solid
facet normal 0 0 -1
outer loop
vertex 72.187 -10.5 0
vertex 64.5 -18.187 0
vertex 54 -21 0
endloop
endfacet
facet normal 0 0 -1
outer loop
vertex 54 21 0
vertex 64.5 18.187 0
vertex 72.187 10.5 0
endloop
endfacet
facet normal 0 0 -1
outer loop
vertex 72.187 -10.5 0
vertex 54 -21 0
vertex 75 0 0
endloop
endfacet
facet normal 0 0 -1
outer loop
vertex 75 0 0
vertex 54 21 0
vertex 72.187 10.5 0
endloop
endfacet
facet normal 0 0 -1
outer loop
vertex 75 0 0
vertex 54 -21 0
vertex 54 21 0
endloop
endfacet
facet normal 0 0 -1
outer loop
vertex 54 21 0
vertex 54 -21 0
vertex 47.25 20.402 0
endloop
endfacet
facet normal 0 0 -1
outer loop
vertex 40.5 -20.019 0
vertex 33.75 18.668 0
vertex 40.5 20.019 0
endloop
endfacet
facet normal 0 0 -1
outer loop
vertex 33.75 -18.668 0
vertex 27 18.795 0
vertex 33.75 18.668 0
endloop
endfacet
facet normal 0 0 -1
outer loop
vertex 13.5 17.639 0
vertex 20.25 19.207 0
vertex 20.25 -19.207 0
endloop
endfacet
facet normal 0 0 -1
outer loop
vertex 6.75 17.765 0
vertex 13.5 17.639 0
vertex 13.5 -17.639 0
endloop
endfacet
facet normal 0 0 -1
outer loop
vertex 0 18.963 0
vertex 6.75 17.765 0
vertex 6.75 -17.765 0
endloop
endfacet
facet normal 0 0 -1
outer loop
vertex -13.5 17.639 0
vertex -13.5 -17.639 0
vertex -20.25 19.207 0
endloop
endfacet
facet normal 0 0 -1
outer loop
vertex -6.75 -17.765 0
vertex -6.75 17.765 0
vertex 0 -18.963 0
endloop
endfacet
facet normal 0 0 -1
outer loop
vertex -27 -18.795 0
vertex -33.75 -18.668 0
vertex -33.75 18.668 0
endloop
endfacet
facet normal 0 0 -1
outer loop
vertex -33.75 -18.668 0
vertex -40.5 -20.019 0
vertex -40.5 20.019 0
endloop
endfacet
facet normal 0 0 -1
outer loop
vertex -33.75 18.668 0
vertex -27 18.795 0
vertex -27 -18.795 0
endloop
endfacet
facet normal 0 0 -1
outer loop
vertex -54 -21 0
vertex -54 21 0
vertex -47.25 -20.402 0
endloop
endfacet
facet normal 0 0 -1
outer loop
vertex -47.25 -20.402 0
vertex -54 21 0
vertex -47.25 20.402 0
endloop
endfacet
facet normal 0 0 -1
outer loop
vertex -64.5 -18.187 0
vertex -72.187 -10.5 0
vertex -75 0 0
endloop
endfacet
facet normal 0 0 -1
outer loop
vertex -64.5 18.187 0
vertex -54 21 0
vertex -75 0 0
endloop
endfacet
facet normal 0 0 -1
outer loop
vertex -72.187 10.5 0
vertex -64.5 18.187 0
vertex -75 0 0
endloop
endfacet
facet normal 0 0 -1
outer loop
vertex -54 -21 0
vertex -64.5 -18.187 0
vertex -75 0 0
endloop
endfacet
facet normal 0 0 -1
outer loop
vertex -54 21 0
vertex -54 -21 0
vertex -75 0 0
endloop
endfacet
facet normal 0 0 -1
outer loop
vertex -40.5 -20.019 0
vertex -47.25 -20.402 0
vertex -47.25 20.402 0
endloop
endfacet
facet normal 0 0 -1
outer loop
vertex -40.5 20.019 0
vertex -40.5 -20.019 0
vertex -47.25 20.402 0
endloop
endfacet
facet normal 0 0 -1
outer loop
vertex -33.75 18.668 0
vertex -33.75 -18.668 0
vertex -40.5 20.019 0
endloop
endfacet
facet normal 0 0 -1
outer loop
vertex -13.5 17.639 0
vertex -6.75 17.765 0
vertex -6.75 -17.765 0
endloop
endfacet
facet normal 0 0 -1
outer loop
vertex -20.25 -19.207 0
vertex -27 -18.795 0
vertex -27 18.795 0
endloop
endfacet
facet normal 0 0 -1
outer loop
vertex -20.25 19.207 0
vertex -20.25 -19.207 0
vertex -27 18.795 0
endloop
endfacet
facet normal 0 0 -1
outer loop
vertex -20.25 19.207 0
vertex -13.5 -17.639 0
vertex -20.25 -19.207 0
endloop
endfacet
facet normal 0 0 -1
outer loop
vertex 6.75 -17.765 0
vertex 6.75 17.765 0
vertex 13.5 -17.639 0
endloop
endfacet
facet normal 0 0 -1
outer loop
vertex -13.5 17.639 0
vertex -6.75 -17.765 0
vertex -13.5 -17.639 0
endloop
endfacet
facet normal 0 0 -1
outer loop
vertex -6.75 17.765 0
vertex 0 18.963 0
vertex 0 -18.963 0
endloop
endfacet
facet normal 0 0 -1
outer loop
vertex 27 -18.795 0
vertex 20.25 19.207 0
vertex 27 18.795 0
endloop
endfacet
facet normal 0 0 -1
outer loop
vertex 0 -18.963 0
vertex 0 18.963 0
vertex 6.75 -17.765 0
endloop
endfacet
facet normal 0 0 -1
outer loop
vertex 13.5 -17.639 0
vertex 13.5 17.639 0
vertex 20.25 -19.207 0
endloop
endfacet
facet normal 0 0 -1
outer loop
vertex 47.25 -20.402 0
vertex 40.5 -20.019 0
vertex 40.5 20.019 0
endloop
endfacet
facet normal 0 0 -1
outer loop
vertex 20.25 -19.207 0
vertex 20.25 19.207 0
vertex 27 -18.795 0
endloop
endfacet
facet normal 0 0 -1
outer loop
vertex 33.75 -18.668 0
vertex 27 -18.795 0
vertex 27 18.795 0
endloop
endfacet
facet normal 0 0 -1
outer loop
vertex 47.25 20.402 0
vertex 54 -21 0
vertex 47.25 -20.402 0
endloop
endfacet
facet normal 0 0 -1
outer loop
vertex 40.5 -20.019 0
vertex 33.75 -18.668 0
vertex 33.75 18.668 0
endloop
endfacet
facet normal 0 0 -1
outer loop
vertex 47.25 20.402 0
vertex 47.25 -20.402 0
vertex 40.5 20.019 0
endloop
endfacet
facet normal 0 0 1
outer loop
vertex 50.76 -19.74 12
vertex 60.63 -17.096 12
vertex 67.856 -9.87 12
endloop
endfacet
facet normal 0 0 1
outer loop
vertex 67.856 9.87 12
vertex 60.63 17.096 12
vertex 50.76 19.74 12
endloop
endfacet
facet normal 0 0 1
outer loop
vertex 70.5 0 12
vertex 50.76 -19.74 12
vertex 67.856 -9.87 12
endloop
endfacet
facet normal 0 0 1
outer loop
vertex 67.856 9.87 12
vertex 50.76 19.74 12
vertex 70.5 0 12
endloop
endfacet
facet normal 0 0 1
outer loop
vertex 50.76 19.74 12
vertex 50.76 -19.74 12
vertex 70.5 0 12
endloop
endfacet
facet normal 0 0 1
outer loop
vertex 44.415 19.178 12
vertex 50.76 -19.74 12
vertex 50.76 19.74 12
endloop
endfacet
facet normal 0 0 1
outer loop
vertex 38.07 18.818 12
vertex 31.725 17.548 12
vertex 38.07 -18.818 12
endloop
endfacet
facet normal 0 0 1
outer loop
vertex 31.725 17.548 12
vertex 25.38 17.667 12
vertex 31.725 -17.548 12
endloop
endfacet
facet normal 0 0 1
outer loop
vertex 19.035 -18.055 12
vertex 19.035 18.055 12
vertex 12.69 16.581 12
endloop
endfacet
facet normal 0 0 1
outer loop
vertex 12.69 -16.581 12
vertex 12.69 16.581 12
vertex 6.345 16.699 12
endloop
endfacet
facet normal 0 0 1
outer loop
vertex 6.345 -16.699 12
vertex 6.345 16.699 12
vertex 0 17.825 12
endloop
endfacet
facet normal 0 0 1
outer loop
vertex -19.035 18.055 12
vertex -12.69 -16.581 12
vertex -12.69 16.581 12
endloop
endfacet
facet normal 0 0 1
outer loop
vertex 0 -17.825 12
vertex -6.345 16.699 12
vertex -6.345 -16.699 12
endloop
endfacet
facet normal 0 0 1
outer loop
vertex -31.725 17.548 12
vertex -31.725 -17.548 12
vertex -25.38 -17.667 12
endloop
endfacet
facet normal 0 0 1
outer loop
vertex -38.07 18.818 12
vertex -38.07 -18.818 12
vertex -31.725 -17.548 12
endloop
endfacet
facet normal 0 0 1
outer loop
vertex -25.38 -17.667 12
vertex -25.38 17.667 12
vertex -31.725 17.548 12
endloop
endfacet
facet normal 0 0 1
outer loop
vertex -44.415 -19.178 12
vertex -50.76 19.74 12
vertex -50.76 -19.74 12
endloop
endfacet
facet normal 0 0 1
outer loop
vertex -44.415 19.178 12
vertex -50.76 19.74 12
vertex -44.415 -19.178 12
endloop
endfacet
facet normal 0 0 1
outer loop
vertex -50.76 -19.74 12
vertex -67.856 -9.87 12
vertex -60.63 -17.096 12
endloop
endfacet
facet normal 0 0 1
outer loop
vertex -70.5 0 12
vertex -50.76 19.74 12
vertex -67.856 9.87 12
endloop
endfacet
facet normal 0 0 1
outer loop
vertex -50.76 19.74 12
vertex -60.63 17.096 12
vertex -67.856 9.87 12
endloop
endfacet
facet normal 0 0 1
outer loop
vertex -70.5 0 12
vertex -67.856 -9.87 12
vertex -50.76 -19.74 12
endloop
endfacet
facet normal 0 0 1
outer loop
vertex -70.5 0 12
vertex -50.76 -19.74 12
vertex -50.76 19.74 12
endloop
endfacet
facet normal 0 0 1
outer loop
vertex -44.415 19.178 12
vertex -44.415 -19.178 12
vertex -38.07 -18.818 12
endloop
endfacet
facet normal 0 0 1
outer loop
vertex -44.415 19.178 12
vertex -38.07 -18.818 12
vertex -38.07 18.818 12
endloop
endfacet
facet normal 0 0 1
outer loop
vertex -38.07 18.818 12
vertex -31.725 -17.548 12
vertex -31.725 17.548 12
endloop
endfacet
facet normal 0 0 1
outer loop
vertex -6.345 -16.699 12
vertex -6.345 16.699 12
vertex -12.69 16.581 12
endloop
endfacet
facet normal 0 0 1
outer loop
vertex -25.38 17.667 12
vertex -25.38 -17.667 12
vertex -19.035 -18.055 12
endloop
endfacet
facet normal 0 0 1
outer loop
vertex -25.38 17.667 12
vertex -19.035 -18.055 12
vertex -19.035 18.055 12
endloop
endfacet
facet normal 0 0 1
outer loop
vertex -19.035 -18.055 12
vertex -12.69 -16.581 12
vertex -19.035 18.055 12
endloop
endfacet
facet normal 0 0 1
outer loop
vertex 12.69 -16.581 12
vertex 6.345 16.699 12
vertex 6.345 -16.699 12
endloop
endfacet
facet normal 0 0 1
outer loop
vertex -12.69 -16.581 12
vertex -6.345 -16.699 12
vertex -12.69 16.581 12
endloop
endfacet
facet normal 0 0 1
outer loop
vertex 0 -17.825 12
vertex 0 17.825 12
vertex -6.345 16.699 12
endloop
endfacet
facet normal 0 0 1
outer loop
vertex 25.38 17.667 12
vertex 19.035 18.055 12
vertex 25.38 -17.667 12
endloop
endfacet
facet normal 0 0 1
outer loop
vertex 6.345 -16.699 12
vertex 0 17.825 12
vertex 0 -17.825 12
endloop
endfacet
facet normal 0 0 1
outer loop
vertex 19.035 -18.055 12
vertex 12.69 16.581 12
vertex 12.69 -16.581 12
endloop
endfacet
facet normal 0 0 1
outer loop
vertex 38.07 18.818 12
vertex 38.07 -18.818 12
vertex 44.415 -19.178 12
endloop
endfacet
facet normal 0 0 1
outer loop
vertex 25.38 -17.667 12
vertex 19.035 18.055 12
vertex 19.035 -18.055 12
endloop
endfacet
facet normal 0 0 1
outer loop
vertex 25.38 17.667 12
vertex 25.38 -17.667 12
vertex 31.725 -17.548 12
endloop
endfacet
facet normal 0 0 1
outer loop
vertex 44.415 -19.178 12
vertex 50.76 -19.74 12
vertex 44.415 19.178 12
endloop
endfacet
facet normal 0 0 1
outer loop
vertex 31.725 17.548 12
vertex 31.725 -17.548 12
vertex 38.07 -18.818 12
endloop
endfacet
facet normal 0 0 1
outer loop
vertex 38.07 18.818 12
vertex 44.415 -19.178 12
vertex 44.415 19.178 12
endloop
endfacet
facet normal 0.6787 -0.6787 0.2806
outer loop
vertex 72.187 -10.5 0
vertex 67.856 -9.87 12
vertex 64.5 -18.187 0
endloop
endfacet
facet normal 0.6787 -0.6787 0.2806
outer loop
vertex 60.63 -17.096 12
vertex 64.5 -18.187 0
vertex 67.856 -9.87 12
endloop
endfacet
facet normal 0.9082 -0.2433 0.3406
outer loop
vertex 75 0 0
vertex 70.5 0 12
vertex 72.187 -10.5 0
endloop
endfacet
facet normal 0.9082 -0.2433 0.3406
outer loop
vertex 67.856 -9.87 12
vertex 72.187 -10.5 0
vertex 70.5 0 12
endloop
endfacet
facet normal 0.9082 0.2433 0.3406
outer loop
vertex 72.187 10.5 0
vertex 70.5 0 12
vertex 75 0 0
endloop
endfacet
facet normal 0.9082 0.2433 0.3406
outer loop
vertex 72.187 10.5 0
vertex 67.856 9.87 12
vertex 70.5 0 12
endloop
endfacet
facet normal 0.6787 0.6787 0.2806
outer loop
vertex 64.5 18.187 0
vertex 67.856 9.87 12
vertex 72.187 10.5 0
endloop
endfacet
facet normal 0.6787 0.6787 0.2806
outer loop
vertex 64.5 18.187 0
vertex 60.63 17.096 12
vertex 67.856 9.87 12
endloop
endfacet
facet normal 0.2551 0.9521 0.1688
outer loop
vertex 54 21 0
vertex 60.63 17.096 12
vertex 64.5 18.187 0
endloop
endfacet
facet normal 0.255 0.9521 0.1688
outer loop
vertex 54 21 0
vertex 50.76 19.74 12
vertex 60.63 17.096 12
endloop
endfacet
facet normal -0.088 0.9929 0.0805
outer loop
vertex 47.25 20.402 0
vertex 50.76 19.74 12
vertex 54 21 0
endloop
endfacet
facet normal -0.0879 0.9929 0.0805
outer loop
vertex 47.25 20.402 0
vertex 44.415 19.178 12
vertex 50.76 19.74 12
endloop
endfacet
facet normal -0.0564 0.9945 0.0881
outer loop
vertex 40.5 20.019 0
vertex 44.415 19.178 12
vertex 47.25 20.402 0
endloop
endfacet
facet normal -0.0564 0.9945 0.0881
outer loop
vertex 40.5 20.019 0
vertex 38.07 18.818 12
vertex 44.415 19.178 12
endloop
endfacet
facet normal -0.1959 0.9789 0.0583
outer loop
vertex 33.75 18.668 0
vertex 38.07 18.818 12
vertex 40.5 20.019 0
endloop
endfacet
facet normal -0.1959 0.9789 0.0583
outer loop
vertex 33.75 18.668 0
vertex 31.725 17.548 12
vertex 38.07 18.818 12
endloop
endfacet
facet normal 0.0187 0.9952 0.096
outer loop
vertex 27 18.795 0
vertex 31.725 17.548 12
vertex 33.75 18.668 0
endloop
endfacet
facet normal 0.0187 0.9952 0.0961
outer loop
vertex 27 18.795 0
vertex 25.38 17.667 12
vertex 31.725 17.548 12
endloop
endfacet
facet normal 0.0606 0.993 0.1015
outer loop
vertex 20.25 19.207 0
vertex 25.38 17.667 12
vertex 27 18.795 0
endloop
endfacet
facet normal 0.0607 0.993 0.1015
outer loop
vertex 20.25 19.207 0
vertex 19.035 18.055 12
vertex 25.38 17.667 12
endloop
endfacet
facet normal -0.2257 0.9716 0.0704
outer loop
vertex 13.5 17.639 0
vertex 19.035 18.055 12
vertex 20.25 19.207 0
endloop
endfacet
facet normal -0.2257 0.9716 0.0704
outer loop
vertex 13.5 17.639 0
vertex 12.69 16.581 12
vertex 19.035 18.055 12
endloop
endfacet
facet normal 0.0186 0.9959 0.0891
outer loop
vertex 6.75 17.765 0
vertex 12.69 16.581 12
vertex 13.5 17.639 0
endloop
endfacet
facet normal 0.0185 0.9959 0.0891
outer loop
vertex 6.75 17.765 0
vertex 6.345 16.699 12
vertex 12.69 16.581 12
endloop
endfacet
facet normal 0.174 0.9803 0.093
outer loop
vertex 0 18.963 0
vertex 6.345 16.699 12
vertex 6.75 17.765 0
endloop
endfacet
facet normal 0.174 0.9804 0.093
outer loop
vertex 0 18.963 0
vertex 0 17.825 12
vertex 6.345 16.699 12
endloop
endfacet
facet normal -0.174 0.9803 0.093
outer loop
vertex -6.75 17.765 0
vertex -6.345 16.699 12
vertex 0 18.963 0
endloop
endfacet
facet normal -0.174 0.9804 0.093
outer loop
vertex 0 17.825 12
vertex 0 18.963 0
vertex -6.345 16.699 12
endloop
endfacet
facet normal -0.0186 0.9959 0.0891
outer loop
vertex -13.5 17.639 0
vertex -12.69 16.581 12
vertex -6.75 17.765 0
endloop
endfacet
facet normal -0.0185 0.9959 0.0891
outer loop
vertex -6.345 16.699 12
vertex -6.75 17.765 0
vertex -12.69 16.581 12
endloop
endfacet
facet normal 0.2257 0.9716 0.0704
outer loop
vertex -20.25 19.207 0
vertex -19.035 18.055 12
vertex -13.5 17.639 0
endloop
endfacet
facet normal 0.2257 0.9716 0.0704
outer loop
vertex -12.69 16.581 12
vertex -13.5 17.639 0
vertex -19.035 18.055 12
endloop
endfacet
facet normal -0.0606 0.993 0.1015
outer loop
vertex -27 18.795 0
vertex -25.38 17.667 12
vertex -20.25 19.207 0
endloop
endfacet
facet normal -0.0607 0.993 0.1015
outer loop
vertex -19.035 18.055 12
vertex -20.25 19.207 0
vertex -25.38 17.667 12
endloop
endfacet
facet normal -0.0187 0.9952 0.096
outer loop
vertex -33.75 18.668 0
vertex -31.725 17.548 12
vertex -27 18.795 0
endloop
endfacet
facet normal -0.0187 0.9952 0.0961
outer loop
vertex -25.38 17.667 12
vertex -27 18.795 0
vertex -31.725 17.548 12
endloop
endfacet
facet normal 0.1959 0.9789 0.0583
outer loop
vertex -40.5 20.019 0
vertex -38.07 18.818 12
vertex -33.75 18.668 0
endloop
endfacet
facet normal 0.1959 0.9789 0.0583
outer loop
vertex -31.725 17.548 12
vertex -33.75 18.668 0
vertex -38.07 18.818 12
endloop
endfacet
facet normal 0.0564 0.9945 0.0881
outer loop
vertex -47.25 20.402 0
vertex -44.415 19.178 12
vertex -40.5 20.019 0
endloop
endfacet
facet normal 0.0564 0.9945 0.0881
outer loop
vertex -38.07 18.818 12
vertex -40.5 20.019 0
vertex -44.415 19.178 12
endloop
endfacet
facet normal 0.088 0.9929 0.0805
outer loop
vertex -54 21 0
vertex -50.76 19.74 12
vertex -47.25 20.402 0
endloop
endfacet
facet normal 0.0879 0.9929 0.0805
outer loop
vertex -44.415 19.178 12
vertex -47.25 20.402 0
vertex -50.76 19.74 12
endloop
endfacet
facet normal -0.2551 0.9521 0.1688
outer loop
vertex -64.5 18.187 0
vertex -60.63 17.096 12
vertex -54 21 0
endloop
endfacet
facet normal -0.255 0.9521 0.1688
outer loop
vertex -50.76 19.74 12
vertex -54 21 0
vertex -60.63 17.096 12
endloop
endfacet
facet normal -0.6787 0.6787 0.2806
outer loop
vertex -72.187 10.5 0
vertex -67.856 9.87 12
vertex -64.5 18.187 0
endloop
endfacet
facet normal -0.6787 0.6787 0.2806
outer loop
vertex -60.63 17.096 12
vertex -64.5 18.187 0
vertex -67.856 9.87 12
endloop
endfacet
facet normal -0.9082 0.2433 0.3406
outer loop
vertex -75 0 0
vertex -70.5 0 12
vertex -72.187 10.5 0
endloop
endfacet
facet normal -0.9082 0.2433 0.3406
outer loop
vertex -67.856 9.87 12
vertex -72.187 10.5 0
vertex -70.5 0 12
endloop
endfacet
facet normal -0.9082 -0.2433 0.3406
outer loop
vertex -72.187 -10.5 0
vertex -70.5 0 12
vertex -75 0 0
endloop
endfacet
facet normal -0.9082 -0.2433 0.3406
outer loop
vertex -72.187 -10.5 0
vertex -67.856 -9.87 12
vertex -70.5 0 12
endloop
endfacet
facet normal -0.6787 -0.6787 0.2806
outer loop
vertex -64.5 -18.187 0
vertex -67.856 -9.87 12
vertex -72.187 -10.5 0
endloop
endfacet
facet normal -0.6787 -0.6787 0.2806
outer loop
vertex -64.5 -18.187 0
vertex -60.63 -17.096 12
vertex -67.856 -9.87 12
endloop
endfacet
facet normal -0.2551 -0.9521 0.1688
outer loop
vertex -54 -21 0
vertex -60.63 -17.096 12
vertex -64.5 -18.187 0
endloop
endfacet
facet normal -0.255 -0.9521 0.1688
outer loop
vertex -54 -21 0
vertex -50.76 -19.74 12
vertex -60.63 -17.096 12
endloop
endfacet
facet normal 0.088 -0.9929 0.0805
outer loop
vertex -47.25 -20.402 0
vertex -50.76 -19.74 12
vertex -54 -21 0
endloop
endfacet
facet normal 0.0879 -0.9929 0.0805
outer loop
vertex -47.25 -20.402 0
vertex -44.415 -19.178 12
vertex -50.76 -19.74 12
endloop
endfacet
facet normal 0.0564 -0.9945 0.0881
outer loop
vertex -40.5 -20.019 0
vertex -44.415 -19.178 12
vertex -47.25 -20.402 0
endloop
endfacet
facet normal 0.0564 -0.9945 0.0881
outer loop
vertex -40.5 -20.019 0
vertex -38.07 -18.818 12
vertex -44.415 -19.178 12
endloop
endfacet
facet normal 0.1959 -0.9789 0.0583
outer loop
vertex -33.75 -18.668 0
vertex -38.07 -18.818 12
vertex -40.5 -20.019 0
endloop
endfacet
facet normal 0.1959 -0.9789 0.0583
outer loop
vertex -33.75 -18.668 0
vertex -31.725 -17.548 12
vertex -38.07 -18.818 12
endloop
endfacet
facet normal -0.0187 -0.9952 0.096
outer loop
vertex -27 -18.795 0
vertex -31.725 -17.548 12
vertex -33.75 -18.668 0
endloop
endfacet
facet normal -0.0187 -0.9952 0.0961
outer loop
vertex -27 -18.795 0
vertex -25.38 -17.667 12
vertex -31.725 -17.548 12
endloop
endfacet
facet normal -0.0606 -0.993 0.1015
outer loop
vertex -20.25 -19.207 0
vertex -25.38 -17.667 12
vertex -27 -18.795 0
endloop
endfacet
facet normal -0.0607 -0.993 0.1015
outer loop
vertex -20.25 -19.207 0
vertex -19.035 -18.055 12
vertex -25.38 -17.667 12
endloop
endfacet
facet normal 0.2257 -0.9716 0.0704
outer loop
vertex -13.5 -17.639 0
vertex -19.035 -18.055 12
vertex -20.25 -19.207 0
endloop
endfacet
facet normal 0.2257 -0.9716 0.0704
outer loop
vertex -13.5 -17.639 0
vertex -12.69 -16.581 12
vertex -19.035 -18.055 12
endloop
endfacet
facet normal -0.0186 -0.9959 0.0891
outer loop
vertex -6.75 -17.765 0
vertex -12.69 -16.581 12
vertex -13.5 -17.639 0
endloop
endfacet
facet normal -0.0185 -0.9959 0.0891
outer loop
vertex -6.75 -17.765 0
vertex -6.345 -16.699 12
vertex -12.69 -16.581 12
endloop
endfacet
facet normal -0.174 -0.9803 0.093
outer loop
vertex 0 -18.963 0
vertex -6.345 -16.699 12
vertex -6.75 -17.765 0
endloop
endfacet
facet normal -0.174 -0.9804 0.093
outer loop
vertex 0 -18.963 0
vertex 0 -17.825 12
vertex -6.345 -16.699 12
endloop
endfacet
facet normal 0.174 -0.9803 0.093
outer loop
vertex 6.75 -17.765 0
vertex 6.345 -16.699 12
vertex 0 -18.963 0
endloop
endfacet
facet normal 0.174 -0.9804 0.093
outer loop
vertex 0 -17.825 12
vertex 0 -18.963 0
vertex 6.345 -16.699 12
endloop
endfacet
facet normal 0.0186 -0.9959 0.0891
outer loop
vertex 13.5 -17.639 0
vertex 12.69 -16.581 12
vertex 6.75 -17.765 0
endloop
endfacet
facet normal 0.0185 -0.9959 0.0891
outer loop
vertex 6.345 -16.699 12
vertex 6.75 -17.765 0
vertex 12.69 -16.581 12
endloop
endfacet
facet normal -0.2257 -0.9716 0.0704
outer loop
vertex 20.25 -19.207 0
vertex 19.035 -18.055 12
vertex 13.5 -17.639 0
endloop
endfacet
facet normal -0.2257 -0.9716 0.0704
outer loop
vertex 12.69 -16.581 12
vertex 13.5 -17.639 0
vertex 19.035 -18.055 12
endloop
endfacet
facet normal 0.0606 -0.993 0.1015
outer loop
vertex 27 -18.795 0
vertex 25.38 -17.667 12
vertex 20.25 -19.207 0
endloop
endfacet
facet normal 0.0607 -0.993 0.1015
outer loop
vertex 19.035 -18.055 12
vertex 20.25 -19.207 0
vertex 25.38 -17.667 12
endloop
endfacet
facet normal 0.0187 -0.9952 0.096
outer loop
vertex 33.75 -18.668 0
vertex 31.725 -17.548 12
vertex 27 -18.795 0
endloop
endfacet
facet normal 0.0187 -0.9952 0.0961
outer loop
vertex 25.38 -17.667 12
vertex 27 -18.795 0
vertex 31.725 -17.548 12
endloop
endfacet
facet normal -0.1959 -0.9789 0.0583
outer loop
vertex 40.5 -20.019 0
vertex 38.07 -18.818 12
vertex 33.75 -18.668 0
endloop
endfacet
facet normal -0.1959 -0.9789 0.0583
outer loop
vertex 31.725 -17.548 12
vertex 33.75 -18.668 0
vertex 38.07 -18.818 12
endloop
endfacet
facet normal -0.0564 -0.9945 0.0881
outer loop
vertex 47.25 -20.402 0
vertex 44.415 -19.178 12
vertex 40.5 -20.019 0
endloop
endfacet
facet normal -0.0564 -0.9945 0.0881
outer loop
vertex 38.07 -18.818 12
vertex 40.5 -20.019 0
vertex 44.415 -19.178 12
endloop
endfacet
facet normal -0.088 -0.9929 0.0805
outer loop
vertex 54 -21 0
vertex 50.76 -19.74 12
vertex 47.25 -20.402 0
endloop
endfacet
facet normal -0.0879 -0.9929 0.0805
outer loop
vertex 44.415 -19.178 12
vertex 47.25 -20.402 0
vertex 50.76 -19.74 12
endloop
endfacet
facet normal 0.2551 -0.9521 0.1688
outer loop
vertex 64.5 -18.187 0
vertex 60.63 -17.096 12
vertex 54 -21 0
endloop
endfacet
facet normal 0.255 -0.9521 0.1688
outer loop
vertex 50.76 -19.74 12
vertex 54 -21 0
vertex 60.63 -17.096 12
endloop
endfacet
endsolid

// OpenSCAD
$fn = 32;

// ----------------------------------------------------------------------
// Handle: 150 x 42 mm grip, 12 mm thick
// ----------------------------------------------------------------------

// --- parameters (mm) ---
length = 150;             // grip length
width = 42;               // grip width
thickness = 12;           // grip thickness
waist = 0.86;             // width factor at the middle
draft = 0.94;             // top face scale of the extrusion
scallops = 5;             // finger rests per side
ripple = 0.05;            // depth factor of the finger rests

/* ergonomic grip outline, closed spline-like polygon in the XY plane */
grip = [[-54, 21], [-47.25, 20.402], [-40.5, 20.019], [-33.75, 18.668], [-27, 18.795], [-20.25, 19.207], [-13.5, 17.639], [-6.75, 17.765], [0, 18.963], [6.75, 17.765], [13.5, 17.639], [20.25, 19.207], [27, 18.795], [33.75, 18.668], [40.5, 20.019], [47.25, 20.402], [54, 21], [64.5, 18.187], [72.187, 10.5], [75, 0], [72.187, -10.5], [64.5, -18.187], [54, -21], [54, -21], [47.25, -20.402], [40.5, -20.019], [33.75, -18.668], [27, -18.795], [20.25, -19.207], [13.5, -17.639], [6.75, -17.765], [0, -18.963], [-6.75, -17.765], [-13.5, -17.639], [-20.25, -19.207], [-27, -18.795], [-33.75, -18.668], [-40.5, -20.019], [-47.25, -20.402], [-54, -21], [-64.5, -18.187], [-72.187, -10.5], [-75, 0], [-72.187, 10.5], [-64.5, 18.187], [-54, 21]];

module grip_body() {
  linear_extrude(height = thickness, scale = draft) polygon(grip);
}

difference() {
  union() {
    grip_body();
  }
}
